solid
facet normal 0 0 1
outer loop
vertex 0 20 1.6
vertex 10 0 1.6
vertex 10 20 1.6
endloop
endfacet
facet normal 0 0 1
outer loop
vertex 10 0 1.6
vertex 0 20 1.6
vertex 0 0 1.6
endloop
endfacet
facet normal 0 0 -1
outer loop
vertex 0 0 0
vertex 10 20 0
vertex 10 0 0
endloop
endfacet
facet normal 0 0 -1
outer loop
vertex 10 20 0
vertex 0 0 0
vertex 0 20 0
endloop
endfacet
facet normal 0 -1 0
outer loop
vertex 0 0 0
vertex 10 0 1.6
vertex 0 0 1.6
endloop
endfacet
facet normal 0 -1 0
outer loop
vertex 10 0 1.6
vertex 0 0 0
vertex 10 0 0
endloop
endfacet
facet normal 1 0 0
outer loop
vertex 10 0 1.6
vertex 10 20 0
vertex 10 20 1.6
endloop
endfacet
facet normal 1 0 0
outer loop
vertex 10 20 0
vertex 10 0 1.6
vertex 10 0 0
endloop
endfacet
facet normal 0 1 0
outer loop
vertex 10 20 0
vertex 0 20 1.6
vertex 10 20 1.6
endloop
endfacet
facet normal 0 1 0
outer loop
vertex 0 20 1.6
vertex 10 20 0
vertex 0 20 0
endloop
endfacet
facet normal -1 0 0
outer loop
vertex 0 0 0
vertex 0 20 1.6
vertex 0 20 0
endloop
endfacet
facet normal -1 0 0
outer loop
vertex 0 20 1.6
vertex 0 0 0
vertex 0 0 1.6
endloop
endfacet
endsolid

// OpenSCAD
$fa=4; // default minimum facet angle is now 0.5
$fs=0.05; // default minimum facet size is now 0.05 mm

wallThickness = 1.6;
barWidth = 10;

cube([barWidth, 2*barWidth, wallThickness]);
